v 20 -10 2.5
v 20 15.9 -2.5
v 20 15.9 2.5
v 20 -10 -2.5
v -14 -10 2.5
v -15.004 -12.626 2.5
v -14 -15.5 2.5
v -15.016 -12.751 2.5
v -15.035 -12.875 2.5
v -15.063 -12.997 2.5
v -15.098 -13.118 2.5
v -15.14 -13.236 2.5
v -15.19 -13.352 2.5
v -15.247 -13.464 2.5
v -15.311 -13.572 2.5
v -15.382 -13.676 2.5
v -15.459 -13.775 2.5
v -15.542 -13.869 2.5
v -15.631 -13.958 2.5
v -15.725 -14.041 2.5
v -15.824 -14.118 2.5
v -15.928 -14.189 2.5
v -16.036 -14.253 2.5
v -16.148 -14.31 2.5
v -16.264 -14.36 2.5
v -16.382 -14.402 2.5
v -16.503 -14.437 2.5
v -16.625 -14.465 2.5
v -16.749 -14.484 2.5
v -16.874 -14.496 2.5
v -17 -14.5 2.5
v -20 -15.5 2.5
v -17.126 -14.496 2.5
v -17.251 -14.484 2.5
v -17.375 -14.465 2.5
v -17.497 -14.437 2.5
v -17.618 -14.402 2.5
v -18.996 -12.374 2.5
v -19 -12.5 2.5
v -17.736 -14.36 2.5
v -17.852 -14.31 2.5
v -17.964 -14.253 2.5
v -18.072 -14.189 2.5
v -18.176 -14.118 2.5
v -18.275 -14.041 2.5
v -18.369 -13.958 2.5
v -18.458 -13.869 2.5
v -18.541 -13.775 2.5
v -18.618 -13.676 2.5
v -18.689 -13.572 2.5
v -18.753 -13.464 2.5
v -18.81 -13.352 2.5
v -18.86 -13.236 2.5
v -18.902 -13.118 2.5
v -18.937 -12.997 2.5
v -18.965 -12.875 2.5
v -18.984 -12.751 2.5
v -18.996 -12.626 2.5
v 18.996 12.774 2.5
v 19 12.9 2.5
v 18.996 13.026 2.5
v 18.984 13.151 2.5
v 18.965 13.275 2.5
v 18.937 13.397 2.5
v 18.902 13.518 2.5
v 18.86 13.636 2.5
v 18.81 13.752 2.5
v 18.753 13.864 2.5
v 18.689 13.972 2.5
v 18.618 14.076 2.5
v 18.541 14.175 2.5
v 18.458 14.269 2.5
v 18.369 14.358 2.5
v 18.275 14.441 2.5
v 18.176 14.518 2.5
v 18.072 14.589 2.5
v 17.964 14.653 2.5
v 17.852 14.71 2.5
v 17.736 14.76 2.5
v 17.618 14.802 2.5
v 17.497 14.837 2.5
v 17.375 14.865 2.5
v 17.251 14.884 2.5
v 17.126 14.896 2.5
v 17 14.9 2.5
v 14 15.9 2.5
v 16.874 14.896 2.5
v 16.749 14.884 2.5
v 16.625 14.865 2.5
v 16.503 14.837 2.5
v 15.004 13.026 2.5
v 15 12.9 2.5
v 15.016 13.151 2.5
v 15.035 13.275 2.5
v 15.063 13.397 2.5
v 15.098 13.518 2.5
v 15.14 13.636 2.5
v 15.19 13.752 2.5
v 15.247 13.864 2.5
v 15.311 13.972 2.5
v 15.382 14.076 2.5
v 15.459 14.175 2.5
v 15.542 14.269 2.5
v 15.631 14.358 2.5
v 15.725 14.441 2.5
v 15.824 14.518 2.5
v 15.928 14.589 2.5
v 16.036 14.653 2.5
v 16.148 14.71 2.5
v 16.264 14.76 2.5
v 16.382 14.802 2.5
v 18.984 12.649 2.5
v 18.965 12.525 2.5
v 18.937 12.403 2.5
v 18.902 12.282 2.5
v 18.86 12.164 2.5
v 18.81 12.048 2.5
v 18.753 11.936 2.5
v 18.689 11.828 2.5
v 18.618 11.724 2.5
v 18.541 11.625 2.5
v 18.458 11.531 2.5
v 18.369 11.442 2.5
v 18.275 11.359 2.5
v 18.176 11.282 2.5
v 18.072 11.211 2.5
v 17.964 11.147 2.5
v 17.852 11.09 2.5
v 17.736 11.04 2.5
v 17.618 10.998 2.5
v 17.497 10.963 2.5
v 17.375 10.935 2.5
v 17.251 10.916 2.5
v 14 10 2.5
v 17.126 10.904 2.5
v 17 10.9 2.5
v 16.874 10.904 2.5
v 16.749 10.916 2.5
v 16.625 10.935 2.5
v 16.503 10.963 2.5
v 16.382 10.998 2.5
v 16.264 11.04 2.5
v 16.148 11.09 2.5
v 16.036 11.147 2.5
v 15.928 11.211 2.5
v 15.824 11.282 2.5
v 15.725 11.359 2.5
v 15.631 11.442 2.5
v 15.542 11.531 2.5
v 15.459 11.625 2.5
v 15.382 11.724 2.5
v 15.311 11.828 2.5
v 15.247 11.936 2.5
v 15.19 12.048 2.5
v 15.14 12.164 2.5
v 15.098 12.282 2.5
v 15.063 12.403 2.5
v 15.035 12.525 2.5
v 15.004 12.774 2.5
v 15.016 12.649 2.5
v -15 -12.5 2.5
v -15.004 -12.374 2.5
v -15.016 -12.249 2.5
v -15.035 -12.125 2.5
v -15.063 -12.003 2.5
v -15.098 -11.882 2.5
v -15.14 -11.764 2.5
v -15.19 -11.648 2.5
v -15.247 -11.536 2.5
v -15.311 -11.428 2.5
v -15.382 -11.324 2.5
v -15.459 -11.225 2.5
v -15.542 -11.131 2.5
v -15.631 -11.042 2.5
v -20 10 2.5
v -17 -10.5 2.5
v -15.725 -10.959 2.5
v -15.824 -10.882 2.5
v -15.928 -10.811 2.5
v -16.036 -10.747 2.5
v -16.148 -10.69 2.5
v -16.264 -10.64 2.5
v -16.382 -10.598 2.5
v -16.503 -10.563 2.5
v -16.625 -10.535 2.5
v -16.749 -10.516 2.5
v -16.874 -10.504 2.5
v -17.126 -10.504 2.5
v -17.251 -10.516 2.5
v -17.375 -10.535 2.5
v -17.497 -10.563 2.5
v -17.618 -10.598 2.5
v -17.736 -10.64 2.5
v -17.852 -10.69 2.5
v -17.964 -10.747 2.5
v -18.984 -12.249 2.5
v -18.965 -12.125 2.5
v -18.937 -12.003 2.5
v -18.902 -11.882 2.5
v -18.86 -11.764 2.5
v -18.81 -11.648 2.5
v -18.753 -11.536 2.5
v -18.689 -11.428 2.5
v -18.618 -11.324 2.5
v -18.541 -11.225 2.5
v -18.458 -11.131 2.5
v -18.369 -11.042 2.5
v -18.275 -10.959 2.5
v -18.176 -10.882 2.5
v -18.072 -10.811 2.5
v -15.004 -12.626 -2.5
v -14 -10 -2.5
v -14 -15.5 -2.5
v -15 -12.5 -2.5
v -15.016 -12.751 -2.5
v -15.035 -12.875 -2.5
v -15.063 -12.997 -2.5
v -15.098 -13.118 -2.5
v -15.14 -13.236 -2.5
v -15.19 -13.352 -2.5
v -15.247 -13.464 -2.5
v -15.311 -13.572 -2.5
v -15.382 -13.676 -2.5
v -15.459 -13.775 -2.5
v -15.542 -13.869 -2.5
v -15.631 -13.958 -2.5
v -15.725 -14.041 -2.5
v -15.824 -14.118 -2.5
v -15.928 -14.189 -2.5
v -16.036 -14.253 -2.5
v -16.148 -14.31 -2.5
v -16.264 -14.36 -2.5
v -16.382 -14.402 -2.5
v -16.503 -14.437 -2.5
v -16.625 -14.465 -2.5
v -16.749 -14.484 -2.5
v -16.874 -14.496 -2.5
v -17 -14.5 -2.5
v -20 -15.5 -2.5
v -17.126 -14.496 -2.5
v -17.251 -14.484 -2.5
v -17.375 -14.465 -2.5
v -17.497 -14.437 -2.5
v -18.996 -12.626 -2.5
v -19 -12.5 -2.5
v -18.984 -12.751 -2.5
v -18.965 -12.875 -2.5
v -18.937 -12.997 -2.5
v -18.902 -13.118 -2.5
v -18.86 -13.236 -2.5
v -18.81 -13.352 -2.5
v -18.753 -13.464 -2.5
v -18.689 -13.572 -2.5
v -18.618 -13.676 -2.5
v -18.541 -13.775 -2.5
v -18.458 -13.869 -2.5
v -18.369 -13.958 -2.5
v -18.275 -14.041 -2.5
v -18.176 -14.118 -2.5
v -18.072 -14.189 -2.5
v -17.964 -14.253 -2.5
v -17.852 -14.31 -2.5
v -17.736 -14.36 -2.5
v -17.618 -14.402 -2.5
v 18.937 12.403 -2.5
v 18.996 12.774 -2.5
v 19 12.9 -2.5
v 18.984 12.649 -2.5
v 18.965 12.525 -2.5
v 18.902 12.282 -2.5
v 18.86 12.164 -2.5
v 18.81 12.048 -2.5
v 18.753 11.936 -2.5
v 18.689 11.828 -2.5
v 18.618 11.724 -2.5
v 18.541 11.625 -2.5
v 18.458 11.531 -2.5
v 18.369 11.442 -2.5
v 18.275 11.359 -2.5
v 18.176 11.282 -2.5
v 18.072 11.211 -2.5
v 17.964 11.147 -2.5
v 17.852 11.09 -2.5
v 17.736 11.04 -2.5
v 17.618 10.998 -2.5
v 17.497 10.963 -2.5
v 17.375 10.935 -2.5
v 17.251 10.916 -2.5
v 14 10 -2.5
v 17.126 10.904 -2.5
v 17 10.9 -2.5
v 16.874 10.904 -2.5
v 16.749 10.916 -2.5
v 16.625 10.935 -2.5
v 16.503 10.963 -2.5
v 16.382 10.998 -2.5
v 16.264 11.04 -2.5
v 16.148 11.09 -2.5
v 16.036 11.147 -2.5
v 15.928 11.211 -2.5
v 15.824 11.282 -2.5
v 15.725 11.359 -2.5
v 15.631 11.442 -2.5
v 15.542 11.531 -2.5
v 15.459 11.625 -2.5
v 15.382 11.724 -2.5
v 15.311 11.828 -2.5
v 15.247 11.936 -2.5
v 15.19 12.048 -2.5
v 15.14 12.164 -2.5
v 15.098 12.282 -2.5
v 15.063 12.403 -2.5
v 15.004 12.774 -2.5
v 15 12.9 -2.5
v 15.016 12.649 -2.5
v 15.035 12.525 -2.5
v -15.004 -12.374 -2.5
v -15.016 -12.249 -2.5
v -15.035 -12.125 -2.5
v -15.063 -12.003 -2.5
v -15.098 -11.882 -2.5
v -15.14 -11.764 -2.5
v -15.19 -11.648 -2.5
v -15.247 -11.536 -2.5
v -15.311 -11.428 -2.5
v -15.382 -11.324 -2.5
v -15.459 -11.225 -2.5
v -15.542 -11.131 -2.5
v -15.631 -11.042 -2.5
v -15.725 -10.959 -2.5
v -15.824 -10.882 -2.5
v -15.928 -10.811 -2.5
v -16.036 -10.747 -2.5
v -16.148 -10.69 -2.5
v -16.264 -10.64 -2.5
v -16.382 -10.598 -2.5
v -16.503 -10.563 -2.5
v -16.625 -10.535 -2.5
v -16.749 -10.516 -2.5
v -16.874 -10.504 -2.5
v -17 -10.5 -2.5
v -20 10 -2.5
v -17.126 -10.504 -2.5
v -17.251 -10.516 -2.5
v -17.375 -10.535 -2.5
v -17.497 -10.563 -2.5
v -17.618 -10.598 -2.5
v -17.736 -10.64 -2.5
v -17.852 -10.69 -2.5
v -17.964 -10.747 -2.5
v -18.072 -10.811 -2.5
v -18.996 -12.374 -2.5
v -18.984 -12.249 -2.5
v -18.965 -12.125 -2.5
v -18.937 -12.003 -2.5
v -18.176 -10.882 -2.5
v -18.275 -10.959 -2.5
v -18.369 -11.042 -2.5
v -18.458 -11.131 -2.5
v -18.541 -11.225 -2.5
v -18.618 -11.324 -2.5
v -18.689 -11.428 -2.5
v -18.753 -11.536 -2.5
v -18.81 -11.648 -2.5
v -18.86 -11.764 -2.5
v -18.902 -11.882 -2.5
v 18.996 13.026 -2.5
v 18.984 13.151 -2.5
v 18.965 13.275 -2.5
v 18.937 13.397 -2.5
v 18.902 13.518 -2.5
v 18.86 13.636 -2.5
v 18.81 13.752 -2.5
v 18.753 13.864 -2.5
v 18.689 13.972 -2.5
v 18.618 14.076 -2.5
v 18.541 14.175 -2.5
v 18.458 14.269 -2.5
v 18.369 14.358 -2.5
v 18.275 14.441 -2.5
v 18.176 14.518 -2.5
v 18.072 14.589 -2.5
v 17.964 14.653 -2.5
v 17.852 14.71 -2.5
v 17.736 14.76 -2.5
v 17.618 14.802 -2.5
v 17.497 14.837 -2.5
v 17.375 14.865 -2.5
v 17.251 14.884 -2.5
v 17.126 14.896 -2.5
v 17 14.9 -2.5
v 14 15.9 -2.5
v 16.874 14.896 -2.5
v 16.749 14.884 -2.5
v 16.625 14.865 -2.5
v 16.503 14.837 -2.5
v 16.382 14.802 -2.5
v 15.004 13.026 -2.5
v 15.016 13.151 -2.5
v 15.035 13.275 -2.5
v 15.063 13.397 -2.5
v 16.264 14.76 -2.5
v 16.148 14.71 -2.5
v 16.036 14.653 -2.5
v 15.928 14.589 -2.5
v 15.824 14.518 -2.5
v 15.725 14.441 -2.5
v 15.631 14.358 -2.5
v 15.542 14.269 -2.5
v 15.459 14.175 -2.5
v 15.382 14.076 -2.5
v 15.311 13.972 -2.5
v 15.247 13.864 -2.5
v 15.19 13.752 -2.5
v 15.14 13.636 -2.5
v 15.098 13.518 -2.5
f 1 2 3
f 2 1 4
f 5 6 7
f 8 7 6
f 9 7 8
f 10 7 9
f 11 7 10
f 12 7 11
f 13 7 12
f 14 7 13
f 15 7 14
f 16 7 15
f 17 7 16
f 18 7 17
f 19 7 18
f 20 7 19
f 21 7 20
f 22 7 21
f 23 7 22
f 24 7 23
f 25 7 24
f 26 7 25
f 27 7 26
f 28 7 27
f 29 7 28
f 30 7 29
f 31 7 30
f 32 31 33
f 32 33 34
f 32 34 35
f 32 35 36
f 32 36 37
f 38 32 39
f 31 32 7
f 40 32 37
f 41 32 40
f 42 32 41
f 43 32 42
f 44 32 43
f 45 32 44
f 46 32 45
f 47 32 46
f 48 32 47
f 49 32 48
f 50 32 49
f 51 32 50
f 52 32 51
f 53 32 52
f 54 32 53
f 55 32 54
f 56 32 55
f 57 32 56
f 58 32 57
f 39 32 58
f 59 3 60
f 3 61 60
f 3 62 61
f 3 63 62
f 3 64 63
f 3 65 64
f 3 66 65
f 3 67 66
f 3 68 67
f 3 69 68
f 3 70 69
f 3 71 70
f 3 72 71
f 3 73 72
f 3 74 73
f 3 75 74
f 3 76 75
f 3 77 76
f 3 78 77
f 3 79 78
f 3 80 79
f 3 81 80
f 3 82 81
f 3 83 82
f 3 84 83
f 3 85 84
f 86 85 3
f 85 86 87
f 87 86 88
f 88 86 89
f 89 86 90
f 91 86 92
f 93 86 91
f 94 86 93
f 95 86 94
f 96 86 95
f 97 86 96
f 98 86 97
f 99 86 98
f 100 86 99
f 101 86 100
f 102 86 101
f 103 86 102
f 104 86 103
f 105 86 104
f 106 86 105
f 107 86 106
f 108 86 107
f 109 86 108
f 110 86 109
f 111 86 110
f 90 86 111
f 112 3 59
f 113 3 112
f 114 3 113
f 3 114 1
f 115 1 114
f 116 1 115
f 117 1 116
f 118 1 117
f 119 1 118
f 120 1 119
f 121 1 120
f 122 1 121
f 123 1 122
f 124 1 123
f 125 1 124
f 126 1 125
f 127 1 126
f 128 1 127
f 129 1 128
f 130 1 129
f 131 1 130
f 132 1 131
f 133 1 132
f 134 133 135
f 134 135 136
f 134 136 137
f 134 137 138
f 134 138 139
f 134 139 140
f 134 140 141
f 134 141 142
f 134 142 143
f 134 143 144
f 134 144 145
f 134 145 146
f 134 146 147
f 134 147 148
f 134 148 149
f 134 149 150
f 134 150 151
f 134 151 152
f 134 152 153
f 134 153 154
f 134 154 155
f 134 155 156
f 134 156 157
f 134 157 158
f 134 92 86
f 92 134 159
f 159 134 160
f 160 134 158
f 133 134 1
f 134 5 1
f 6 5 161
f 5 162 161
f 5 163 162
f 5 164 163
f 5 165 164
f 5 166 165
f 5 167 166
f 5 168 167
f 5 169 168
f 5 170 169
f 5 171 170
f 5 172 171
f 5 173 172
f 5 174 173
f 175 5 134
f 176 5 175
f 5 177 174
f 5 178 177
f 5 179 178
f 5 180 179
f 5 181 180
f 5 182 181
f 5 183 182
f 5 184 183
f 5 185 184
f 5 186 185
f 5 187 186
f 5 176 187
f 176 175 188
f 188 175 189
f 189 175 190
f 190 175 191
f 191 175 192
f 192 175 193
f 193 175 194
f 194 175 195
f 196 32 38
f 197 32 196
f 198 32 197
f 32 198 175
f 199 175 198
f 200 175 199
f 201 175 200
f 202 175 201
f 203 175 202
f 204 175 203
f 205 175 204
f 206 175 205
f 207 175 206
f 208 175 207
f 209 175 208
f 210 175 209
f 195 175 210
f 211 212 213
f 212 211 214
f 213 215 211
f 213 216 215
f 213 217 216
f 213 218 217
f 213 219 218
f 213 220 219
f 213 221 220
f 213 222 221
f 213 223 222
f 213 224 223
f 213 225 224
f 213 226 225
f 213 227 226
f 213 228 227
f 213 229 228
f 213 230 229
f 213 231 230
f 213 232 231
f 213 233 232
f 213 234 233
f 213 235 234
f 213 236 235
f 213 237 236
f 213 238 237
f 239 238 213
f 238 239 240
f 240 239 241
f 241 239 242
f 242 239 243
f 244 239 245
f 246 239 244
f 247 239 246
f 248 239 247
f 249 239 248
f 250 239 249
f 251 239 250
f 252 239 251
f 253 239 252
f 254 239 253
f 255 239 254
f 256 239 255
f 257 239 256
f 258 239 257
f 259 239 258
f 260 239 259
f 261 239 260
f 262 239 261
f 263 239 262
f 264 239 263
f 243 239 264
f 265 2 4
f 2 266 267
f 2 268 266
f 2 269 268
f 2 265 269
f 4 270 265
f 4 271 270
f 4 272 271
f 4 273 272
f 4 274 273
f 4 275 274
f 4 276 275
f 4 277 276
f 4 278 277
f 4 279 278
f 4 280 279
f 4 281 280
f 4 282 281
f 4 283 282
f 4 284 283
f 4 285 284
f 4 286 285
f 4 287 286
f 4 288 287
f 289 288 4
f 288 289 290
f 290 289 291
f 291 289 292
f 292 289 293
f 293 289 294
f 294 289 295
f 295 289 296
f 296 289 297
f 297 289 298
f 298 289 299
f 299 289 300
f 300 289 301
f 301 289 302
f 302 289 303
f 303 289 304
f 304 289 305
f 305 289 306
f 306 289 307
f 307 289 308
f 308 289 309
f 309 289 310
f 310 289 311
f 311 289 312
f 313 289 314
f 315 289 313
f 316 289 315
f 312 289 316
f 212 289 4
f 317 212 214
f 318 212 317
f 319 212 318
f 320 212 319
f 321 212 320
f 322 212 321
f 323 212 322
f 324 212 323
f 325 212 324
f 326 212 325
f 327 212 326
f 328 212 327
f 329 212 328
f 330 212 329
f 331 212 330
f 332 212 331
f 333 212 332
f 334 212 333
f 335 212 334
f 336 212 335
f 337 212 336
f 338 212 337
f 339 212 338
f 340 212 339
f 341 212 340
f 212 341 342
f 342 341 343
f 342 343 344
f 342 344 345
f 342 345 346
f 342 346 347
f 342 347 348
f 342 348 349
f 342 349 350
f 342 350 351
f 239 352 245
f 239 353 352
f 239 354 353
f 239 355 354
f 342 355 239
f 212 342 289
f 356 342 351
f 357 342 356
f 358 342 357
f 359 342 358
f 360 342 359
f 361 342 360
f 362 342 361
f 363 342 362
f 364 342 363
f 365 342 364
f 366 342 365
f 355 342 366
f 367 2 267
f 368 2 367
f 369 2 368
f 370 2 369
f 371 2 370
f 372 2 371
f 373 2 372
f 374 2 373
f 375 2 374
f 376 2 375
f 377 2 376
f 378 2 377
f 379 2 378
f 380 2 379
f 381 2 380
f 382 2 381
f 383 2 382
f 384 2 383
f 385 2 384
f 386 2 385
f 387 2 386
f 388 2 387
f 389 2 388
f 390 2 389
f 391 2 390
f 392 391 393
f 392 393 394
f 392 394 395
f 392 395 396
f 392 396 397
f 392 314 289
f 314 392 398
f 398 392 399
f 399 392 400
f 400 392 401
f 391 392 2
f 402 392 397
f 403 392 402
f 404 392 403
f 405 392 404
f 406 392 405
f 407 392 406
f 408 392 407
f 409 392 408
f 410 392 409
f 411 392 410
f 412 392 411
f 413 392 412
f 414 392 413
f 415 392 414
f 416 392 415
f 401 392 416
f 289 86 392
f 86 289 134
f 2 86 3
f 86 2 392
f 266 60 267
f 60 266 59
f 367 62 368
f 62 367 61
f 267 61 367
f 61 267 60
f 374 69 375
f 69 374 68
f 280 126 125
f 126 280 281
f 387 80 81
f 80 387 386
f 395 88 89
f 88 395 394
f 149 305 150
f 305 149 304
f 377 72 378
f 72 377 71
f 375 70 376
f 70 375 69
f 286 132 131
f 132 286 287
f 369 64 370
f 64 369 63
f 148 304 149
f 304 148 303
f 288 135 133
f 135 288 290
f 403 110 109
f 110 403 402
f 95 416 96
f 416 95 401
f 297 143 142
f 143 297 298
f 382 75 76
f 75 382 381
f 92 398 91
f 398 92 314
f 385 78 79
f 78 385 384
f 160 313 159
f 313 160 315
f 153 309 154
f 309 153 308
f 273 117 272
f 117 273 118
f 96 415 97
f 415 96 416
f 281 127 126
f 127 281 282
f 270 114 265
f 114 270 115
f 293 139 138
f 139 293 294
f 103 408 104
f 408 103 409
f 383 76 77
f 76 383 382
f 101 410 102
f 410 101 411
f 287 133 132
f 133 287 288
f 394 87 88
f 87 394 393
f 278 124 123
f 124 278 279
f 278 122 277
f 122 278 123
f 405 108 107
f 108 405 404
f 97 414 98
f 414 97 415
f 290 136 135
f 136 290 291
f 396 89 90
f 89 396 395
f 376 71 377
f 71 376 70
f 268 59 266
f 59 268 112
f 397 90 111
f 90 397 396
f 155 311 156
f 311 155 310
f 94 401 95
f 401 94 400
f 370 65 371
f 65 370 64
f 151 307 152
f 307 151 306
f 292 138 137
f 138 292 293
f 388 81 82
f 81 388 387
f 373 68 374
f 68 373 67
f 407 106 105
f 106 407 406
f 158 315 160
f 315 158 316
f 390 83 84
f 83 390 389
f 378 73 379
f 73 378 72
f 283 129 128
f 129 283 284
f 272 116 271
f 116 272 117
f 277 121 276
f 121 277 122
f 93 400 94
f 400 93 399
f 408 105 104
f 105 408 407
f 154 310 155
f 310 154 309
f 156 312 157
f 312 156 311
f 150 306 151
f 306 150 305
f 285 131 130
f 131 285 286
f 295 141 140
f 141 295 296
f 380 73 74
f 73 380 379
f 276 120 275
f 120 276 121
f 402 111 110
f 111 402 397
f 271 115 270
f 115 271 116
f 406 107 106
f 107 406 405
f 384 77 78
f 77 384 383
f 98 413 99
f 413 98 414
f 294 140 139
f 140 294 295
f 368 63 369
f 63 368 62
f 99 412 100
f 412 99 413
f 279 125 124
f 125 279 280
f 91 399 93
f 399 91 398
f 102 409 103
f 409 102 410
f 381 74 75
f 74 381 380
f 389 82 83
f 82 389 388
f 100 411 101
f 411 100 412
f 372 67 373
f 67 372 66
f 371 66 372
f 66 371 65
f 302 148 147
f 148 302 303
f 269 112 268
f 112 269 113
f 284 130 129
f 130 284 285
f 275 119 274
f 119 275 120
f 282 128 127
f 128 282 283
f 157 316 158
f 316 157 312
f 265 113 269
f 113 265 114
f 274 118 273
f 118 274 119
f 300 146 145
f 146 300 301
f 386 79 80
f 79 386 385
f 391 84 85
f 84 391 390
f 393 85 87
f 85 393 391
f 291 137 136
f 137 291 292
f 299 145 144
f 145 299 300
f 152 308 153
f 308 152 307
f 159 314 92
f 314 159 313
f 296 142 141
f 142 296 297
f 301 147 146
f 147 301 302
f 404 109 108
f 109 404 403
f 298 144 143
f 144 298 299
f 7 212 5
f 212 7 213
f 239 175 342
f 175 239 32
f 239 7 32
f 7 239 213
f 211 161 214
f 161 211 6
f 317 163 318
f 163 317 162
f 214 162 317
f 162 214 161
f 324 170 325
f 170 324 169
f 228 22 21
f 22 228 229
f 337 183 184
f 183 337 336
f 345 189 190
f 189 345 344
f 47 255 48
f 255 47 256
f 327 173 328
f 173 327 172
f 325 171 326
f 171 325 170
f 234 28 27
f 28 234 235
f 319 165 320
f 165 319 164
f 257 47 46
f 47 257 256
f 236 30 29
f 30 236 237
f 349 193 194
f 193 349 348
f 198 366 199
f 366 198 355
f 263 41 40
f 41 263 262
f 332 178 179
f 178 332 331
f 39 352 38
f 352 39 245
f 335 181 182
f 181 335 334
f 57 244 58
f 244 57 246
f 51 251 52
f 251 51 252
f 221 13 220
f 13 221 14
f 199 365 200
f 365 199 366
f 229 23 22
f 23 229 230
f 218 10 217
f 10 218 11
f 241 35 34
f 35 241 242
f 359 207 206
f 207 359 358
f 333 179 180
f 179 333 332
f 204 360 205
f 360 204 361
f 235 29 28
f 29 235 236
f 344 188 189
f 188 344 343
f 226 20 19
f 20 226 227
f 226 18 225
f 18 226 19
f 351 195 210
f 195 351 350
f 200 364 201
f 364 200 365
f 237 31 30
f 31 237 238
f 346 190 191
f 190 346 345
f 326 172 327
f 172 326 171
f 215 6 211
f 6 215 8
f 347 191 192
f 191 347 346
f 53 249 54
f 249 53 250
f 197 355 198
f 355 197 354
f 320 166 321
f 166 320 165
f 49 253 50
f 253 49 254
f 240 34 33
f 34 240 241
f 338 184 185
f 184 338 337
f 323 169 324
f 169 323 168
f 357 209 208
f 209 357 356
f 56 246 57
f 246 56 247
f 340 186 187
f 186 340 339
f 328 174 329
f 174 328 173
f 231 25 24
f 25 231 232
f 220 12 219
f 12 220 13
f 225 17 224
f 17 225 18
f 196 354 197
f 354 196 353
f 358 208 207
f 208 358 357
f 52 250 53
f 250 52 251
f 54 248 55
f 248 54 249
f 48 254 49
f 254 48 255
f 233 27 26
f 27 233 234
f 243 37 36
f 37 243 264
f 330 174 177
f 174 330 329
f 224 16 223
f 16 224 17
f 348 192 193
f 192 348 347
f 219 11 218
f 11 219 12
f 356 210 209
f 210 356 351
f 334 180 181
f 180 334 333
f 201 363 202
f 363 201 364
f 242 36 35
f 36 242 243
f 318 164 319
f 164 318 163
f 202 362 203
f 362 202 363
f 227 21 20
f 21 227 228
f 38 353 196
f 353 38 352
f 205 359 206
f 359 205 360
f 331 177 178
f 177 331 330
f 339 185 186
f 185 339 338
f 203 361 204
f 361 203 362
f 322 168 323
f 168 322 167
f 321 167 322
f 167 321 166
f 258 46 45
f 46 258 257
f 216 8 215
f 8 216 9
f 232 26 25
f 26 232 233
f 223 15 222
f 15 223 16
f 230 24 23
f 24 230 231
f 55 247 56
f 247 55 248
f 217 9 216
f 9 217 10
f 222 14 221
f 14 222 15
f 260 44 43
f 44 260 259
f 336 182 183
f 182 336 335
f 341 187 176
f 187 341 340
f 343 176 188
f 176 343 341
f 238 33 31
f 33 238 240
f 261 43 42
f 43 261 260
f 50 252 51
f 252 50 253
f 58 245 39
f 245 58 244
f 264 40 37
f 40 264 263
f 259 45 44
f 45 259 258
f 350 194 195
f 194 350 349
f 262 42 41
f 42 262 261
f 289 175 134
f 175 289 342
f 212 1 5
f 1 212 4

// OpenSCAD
cuboBase();
module cuboBase(){
    union(){
        cube(size = [40,20,5], center = true);
        apendice();
        translate([-17.0*2,-12.7*2,0])
        apendice();
    }
}
    //Apendices
module apendice(){
    difference(){
        translate([17.0,12.9,0])
        cube(size = [6,6,5], center = true);
        translate([17.0,12.9,-4])
        agujero();
    }
}

module agujero(){
    cylinder(r=2,h=20,$fn=100);
}
